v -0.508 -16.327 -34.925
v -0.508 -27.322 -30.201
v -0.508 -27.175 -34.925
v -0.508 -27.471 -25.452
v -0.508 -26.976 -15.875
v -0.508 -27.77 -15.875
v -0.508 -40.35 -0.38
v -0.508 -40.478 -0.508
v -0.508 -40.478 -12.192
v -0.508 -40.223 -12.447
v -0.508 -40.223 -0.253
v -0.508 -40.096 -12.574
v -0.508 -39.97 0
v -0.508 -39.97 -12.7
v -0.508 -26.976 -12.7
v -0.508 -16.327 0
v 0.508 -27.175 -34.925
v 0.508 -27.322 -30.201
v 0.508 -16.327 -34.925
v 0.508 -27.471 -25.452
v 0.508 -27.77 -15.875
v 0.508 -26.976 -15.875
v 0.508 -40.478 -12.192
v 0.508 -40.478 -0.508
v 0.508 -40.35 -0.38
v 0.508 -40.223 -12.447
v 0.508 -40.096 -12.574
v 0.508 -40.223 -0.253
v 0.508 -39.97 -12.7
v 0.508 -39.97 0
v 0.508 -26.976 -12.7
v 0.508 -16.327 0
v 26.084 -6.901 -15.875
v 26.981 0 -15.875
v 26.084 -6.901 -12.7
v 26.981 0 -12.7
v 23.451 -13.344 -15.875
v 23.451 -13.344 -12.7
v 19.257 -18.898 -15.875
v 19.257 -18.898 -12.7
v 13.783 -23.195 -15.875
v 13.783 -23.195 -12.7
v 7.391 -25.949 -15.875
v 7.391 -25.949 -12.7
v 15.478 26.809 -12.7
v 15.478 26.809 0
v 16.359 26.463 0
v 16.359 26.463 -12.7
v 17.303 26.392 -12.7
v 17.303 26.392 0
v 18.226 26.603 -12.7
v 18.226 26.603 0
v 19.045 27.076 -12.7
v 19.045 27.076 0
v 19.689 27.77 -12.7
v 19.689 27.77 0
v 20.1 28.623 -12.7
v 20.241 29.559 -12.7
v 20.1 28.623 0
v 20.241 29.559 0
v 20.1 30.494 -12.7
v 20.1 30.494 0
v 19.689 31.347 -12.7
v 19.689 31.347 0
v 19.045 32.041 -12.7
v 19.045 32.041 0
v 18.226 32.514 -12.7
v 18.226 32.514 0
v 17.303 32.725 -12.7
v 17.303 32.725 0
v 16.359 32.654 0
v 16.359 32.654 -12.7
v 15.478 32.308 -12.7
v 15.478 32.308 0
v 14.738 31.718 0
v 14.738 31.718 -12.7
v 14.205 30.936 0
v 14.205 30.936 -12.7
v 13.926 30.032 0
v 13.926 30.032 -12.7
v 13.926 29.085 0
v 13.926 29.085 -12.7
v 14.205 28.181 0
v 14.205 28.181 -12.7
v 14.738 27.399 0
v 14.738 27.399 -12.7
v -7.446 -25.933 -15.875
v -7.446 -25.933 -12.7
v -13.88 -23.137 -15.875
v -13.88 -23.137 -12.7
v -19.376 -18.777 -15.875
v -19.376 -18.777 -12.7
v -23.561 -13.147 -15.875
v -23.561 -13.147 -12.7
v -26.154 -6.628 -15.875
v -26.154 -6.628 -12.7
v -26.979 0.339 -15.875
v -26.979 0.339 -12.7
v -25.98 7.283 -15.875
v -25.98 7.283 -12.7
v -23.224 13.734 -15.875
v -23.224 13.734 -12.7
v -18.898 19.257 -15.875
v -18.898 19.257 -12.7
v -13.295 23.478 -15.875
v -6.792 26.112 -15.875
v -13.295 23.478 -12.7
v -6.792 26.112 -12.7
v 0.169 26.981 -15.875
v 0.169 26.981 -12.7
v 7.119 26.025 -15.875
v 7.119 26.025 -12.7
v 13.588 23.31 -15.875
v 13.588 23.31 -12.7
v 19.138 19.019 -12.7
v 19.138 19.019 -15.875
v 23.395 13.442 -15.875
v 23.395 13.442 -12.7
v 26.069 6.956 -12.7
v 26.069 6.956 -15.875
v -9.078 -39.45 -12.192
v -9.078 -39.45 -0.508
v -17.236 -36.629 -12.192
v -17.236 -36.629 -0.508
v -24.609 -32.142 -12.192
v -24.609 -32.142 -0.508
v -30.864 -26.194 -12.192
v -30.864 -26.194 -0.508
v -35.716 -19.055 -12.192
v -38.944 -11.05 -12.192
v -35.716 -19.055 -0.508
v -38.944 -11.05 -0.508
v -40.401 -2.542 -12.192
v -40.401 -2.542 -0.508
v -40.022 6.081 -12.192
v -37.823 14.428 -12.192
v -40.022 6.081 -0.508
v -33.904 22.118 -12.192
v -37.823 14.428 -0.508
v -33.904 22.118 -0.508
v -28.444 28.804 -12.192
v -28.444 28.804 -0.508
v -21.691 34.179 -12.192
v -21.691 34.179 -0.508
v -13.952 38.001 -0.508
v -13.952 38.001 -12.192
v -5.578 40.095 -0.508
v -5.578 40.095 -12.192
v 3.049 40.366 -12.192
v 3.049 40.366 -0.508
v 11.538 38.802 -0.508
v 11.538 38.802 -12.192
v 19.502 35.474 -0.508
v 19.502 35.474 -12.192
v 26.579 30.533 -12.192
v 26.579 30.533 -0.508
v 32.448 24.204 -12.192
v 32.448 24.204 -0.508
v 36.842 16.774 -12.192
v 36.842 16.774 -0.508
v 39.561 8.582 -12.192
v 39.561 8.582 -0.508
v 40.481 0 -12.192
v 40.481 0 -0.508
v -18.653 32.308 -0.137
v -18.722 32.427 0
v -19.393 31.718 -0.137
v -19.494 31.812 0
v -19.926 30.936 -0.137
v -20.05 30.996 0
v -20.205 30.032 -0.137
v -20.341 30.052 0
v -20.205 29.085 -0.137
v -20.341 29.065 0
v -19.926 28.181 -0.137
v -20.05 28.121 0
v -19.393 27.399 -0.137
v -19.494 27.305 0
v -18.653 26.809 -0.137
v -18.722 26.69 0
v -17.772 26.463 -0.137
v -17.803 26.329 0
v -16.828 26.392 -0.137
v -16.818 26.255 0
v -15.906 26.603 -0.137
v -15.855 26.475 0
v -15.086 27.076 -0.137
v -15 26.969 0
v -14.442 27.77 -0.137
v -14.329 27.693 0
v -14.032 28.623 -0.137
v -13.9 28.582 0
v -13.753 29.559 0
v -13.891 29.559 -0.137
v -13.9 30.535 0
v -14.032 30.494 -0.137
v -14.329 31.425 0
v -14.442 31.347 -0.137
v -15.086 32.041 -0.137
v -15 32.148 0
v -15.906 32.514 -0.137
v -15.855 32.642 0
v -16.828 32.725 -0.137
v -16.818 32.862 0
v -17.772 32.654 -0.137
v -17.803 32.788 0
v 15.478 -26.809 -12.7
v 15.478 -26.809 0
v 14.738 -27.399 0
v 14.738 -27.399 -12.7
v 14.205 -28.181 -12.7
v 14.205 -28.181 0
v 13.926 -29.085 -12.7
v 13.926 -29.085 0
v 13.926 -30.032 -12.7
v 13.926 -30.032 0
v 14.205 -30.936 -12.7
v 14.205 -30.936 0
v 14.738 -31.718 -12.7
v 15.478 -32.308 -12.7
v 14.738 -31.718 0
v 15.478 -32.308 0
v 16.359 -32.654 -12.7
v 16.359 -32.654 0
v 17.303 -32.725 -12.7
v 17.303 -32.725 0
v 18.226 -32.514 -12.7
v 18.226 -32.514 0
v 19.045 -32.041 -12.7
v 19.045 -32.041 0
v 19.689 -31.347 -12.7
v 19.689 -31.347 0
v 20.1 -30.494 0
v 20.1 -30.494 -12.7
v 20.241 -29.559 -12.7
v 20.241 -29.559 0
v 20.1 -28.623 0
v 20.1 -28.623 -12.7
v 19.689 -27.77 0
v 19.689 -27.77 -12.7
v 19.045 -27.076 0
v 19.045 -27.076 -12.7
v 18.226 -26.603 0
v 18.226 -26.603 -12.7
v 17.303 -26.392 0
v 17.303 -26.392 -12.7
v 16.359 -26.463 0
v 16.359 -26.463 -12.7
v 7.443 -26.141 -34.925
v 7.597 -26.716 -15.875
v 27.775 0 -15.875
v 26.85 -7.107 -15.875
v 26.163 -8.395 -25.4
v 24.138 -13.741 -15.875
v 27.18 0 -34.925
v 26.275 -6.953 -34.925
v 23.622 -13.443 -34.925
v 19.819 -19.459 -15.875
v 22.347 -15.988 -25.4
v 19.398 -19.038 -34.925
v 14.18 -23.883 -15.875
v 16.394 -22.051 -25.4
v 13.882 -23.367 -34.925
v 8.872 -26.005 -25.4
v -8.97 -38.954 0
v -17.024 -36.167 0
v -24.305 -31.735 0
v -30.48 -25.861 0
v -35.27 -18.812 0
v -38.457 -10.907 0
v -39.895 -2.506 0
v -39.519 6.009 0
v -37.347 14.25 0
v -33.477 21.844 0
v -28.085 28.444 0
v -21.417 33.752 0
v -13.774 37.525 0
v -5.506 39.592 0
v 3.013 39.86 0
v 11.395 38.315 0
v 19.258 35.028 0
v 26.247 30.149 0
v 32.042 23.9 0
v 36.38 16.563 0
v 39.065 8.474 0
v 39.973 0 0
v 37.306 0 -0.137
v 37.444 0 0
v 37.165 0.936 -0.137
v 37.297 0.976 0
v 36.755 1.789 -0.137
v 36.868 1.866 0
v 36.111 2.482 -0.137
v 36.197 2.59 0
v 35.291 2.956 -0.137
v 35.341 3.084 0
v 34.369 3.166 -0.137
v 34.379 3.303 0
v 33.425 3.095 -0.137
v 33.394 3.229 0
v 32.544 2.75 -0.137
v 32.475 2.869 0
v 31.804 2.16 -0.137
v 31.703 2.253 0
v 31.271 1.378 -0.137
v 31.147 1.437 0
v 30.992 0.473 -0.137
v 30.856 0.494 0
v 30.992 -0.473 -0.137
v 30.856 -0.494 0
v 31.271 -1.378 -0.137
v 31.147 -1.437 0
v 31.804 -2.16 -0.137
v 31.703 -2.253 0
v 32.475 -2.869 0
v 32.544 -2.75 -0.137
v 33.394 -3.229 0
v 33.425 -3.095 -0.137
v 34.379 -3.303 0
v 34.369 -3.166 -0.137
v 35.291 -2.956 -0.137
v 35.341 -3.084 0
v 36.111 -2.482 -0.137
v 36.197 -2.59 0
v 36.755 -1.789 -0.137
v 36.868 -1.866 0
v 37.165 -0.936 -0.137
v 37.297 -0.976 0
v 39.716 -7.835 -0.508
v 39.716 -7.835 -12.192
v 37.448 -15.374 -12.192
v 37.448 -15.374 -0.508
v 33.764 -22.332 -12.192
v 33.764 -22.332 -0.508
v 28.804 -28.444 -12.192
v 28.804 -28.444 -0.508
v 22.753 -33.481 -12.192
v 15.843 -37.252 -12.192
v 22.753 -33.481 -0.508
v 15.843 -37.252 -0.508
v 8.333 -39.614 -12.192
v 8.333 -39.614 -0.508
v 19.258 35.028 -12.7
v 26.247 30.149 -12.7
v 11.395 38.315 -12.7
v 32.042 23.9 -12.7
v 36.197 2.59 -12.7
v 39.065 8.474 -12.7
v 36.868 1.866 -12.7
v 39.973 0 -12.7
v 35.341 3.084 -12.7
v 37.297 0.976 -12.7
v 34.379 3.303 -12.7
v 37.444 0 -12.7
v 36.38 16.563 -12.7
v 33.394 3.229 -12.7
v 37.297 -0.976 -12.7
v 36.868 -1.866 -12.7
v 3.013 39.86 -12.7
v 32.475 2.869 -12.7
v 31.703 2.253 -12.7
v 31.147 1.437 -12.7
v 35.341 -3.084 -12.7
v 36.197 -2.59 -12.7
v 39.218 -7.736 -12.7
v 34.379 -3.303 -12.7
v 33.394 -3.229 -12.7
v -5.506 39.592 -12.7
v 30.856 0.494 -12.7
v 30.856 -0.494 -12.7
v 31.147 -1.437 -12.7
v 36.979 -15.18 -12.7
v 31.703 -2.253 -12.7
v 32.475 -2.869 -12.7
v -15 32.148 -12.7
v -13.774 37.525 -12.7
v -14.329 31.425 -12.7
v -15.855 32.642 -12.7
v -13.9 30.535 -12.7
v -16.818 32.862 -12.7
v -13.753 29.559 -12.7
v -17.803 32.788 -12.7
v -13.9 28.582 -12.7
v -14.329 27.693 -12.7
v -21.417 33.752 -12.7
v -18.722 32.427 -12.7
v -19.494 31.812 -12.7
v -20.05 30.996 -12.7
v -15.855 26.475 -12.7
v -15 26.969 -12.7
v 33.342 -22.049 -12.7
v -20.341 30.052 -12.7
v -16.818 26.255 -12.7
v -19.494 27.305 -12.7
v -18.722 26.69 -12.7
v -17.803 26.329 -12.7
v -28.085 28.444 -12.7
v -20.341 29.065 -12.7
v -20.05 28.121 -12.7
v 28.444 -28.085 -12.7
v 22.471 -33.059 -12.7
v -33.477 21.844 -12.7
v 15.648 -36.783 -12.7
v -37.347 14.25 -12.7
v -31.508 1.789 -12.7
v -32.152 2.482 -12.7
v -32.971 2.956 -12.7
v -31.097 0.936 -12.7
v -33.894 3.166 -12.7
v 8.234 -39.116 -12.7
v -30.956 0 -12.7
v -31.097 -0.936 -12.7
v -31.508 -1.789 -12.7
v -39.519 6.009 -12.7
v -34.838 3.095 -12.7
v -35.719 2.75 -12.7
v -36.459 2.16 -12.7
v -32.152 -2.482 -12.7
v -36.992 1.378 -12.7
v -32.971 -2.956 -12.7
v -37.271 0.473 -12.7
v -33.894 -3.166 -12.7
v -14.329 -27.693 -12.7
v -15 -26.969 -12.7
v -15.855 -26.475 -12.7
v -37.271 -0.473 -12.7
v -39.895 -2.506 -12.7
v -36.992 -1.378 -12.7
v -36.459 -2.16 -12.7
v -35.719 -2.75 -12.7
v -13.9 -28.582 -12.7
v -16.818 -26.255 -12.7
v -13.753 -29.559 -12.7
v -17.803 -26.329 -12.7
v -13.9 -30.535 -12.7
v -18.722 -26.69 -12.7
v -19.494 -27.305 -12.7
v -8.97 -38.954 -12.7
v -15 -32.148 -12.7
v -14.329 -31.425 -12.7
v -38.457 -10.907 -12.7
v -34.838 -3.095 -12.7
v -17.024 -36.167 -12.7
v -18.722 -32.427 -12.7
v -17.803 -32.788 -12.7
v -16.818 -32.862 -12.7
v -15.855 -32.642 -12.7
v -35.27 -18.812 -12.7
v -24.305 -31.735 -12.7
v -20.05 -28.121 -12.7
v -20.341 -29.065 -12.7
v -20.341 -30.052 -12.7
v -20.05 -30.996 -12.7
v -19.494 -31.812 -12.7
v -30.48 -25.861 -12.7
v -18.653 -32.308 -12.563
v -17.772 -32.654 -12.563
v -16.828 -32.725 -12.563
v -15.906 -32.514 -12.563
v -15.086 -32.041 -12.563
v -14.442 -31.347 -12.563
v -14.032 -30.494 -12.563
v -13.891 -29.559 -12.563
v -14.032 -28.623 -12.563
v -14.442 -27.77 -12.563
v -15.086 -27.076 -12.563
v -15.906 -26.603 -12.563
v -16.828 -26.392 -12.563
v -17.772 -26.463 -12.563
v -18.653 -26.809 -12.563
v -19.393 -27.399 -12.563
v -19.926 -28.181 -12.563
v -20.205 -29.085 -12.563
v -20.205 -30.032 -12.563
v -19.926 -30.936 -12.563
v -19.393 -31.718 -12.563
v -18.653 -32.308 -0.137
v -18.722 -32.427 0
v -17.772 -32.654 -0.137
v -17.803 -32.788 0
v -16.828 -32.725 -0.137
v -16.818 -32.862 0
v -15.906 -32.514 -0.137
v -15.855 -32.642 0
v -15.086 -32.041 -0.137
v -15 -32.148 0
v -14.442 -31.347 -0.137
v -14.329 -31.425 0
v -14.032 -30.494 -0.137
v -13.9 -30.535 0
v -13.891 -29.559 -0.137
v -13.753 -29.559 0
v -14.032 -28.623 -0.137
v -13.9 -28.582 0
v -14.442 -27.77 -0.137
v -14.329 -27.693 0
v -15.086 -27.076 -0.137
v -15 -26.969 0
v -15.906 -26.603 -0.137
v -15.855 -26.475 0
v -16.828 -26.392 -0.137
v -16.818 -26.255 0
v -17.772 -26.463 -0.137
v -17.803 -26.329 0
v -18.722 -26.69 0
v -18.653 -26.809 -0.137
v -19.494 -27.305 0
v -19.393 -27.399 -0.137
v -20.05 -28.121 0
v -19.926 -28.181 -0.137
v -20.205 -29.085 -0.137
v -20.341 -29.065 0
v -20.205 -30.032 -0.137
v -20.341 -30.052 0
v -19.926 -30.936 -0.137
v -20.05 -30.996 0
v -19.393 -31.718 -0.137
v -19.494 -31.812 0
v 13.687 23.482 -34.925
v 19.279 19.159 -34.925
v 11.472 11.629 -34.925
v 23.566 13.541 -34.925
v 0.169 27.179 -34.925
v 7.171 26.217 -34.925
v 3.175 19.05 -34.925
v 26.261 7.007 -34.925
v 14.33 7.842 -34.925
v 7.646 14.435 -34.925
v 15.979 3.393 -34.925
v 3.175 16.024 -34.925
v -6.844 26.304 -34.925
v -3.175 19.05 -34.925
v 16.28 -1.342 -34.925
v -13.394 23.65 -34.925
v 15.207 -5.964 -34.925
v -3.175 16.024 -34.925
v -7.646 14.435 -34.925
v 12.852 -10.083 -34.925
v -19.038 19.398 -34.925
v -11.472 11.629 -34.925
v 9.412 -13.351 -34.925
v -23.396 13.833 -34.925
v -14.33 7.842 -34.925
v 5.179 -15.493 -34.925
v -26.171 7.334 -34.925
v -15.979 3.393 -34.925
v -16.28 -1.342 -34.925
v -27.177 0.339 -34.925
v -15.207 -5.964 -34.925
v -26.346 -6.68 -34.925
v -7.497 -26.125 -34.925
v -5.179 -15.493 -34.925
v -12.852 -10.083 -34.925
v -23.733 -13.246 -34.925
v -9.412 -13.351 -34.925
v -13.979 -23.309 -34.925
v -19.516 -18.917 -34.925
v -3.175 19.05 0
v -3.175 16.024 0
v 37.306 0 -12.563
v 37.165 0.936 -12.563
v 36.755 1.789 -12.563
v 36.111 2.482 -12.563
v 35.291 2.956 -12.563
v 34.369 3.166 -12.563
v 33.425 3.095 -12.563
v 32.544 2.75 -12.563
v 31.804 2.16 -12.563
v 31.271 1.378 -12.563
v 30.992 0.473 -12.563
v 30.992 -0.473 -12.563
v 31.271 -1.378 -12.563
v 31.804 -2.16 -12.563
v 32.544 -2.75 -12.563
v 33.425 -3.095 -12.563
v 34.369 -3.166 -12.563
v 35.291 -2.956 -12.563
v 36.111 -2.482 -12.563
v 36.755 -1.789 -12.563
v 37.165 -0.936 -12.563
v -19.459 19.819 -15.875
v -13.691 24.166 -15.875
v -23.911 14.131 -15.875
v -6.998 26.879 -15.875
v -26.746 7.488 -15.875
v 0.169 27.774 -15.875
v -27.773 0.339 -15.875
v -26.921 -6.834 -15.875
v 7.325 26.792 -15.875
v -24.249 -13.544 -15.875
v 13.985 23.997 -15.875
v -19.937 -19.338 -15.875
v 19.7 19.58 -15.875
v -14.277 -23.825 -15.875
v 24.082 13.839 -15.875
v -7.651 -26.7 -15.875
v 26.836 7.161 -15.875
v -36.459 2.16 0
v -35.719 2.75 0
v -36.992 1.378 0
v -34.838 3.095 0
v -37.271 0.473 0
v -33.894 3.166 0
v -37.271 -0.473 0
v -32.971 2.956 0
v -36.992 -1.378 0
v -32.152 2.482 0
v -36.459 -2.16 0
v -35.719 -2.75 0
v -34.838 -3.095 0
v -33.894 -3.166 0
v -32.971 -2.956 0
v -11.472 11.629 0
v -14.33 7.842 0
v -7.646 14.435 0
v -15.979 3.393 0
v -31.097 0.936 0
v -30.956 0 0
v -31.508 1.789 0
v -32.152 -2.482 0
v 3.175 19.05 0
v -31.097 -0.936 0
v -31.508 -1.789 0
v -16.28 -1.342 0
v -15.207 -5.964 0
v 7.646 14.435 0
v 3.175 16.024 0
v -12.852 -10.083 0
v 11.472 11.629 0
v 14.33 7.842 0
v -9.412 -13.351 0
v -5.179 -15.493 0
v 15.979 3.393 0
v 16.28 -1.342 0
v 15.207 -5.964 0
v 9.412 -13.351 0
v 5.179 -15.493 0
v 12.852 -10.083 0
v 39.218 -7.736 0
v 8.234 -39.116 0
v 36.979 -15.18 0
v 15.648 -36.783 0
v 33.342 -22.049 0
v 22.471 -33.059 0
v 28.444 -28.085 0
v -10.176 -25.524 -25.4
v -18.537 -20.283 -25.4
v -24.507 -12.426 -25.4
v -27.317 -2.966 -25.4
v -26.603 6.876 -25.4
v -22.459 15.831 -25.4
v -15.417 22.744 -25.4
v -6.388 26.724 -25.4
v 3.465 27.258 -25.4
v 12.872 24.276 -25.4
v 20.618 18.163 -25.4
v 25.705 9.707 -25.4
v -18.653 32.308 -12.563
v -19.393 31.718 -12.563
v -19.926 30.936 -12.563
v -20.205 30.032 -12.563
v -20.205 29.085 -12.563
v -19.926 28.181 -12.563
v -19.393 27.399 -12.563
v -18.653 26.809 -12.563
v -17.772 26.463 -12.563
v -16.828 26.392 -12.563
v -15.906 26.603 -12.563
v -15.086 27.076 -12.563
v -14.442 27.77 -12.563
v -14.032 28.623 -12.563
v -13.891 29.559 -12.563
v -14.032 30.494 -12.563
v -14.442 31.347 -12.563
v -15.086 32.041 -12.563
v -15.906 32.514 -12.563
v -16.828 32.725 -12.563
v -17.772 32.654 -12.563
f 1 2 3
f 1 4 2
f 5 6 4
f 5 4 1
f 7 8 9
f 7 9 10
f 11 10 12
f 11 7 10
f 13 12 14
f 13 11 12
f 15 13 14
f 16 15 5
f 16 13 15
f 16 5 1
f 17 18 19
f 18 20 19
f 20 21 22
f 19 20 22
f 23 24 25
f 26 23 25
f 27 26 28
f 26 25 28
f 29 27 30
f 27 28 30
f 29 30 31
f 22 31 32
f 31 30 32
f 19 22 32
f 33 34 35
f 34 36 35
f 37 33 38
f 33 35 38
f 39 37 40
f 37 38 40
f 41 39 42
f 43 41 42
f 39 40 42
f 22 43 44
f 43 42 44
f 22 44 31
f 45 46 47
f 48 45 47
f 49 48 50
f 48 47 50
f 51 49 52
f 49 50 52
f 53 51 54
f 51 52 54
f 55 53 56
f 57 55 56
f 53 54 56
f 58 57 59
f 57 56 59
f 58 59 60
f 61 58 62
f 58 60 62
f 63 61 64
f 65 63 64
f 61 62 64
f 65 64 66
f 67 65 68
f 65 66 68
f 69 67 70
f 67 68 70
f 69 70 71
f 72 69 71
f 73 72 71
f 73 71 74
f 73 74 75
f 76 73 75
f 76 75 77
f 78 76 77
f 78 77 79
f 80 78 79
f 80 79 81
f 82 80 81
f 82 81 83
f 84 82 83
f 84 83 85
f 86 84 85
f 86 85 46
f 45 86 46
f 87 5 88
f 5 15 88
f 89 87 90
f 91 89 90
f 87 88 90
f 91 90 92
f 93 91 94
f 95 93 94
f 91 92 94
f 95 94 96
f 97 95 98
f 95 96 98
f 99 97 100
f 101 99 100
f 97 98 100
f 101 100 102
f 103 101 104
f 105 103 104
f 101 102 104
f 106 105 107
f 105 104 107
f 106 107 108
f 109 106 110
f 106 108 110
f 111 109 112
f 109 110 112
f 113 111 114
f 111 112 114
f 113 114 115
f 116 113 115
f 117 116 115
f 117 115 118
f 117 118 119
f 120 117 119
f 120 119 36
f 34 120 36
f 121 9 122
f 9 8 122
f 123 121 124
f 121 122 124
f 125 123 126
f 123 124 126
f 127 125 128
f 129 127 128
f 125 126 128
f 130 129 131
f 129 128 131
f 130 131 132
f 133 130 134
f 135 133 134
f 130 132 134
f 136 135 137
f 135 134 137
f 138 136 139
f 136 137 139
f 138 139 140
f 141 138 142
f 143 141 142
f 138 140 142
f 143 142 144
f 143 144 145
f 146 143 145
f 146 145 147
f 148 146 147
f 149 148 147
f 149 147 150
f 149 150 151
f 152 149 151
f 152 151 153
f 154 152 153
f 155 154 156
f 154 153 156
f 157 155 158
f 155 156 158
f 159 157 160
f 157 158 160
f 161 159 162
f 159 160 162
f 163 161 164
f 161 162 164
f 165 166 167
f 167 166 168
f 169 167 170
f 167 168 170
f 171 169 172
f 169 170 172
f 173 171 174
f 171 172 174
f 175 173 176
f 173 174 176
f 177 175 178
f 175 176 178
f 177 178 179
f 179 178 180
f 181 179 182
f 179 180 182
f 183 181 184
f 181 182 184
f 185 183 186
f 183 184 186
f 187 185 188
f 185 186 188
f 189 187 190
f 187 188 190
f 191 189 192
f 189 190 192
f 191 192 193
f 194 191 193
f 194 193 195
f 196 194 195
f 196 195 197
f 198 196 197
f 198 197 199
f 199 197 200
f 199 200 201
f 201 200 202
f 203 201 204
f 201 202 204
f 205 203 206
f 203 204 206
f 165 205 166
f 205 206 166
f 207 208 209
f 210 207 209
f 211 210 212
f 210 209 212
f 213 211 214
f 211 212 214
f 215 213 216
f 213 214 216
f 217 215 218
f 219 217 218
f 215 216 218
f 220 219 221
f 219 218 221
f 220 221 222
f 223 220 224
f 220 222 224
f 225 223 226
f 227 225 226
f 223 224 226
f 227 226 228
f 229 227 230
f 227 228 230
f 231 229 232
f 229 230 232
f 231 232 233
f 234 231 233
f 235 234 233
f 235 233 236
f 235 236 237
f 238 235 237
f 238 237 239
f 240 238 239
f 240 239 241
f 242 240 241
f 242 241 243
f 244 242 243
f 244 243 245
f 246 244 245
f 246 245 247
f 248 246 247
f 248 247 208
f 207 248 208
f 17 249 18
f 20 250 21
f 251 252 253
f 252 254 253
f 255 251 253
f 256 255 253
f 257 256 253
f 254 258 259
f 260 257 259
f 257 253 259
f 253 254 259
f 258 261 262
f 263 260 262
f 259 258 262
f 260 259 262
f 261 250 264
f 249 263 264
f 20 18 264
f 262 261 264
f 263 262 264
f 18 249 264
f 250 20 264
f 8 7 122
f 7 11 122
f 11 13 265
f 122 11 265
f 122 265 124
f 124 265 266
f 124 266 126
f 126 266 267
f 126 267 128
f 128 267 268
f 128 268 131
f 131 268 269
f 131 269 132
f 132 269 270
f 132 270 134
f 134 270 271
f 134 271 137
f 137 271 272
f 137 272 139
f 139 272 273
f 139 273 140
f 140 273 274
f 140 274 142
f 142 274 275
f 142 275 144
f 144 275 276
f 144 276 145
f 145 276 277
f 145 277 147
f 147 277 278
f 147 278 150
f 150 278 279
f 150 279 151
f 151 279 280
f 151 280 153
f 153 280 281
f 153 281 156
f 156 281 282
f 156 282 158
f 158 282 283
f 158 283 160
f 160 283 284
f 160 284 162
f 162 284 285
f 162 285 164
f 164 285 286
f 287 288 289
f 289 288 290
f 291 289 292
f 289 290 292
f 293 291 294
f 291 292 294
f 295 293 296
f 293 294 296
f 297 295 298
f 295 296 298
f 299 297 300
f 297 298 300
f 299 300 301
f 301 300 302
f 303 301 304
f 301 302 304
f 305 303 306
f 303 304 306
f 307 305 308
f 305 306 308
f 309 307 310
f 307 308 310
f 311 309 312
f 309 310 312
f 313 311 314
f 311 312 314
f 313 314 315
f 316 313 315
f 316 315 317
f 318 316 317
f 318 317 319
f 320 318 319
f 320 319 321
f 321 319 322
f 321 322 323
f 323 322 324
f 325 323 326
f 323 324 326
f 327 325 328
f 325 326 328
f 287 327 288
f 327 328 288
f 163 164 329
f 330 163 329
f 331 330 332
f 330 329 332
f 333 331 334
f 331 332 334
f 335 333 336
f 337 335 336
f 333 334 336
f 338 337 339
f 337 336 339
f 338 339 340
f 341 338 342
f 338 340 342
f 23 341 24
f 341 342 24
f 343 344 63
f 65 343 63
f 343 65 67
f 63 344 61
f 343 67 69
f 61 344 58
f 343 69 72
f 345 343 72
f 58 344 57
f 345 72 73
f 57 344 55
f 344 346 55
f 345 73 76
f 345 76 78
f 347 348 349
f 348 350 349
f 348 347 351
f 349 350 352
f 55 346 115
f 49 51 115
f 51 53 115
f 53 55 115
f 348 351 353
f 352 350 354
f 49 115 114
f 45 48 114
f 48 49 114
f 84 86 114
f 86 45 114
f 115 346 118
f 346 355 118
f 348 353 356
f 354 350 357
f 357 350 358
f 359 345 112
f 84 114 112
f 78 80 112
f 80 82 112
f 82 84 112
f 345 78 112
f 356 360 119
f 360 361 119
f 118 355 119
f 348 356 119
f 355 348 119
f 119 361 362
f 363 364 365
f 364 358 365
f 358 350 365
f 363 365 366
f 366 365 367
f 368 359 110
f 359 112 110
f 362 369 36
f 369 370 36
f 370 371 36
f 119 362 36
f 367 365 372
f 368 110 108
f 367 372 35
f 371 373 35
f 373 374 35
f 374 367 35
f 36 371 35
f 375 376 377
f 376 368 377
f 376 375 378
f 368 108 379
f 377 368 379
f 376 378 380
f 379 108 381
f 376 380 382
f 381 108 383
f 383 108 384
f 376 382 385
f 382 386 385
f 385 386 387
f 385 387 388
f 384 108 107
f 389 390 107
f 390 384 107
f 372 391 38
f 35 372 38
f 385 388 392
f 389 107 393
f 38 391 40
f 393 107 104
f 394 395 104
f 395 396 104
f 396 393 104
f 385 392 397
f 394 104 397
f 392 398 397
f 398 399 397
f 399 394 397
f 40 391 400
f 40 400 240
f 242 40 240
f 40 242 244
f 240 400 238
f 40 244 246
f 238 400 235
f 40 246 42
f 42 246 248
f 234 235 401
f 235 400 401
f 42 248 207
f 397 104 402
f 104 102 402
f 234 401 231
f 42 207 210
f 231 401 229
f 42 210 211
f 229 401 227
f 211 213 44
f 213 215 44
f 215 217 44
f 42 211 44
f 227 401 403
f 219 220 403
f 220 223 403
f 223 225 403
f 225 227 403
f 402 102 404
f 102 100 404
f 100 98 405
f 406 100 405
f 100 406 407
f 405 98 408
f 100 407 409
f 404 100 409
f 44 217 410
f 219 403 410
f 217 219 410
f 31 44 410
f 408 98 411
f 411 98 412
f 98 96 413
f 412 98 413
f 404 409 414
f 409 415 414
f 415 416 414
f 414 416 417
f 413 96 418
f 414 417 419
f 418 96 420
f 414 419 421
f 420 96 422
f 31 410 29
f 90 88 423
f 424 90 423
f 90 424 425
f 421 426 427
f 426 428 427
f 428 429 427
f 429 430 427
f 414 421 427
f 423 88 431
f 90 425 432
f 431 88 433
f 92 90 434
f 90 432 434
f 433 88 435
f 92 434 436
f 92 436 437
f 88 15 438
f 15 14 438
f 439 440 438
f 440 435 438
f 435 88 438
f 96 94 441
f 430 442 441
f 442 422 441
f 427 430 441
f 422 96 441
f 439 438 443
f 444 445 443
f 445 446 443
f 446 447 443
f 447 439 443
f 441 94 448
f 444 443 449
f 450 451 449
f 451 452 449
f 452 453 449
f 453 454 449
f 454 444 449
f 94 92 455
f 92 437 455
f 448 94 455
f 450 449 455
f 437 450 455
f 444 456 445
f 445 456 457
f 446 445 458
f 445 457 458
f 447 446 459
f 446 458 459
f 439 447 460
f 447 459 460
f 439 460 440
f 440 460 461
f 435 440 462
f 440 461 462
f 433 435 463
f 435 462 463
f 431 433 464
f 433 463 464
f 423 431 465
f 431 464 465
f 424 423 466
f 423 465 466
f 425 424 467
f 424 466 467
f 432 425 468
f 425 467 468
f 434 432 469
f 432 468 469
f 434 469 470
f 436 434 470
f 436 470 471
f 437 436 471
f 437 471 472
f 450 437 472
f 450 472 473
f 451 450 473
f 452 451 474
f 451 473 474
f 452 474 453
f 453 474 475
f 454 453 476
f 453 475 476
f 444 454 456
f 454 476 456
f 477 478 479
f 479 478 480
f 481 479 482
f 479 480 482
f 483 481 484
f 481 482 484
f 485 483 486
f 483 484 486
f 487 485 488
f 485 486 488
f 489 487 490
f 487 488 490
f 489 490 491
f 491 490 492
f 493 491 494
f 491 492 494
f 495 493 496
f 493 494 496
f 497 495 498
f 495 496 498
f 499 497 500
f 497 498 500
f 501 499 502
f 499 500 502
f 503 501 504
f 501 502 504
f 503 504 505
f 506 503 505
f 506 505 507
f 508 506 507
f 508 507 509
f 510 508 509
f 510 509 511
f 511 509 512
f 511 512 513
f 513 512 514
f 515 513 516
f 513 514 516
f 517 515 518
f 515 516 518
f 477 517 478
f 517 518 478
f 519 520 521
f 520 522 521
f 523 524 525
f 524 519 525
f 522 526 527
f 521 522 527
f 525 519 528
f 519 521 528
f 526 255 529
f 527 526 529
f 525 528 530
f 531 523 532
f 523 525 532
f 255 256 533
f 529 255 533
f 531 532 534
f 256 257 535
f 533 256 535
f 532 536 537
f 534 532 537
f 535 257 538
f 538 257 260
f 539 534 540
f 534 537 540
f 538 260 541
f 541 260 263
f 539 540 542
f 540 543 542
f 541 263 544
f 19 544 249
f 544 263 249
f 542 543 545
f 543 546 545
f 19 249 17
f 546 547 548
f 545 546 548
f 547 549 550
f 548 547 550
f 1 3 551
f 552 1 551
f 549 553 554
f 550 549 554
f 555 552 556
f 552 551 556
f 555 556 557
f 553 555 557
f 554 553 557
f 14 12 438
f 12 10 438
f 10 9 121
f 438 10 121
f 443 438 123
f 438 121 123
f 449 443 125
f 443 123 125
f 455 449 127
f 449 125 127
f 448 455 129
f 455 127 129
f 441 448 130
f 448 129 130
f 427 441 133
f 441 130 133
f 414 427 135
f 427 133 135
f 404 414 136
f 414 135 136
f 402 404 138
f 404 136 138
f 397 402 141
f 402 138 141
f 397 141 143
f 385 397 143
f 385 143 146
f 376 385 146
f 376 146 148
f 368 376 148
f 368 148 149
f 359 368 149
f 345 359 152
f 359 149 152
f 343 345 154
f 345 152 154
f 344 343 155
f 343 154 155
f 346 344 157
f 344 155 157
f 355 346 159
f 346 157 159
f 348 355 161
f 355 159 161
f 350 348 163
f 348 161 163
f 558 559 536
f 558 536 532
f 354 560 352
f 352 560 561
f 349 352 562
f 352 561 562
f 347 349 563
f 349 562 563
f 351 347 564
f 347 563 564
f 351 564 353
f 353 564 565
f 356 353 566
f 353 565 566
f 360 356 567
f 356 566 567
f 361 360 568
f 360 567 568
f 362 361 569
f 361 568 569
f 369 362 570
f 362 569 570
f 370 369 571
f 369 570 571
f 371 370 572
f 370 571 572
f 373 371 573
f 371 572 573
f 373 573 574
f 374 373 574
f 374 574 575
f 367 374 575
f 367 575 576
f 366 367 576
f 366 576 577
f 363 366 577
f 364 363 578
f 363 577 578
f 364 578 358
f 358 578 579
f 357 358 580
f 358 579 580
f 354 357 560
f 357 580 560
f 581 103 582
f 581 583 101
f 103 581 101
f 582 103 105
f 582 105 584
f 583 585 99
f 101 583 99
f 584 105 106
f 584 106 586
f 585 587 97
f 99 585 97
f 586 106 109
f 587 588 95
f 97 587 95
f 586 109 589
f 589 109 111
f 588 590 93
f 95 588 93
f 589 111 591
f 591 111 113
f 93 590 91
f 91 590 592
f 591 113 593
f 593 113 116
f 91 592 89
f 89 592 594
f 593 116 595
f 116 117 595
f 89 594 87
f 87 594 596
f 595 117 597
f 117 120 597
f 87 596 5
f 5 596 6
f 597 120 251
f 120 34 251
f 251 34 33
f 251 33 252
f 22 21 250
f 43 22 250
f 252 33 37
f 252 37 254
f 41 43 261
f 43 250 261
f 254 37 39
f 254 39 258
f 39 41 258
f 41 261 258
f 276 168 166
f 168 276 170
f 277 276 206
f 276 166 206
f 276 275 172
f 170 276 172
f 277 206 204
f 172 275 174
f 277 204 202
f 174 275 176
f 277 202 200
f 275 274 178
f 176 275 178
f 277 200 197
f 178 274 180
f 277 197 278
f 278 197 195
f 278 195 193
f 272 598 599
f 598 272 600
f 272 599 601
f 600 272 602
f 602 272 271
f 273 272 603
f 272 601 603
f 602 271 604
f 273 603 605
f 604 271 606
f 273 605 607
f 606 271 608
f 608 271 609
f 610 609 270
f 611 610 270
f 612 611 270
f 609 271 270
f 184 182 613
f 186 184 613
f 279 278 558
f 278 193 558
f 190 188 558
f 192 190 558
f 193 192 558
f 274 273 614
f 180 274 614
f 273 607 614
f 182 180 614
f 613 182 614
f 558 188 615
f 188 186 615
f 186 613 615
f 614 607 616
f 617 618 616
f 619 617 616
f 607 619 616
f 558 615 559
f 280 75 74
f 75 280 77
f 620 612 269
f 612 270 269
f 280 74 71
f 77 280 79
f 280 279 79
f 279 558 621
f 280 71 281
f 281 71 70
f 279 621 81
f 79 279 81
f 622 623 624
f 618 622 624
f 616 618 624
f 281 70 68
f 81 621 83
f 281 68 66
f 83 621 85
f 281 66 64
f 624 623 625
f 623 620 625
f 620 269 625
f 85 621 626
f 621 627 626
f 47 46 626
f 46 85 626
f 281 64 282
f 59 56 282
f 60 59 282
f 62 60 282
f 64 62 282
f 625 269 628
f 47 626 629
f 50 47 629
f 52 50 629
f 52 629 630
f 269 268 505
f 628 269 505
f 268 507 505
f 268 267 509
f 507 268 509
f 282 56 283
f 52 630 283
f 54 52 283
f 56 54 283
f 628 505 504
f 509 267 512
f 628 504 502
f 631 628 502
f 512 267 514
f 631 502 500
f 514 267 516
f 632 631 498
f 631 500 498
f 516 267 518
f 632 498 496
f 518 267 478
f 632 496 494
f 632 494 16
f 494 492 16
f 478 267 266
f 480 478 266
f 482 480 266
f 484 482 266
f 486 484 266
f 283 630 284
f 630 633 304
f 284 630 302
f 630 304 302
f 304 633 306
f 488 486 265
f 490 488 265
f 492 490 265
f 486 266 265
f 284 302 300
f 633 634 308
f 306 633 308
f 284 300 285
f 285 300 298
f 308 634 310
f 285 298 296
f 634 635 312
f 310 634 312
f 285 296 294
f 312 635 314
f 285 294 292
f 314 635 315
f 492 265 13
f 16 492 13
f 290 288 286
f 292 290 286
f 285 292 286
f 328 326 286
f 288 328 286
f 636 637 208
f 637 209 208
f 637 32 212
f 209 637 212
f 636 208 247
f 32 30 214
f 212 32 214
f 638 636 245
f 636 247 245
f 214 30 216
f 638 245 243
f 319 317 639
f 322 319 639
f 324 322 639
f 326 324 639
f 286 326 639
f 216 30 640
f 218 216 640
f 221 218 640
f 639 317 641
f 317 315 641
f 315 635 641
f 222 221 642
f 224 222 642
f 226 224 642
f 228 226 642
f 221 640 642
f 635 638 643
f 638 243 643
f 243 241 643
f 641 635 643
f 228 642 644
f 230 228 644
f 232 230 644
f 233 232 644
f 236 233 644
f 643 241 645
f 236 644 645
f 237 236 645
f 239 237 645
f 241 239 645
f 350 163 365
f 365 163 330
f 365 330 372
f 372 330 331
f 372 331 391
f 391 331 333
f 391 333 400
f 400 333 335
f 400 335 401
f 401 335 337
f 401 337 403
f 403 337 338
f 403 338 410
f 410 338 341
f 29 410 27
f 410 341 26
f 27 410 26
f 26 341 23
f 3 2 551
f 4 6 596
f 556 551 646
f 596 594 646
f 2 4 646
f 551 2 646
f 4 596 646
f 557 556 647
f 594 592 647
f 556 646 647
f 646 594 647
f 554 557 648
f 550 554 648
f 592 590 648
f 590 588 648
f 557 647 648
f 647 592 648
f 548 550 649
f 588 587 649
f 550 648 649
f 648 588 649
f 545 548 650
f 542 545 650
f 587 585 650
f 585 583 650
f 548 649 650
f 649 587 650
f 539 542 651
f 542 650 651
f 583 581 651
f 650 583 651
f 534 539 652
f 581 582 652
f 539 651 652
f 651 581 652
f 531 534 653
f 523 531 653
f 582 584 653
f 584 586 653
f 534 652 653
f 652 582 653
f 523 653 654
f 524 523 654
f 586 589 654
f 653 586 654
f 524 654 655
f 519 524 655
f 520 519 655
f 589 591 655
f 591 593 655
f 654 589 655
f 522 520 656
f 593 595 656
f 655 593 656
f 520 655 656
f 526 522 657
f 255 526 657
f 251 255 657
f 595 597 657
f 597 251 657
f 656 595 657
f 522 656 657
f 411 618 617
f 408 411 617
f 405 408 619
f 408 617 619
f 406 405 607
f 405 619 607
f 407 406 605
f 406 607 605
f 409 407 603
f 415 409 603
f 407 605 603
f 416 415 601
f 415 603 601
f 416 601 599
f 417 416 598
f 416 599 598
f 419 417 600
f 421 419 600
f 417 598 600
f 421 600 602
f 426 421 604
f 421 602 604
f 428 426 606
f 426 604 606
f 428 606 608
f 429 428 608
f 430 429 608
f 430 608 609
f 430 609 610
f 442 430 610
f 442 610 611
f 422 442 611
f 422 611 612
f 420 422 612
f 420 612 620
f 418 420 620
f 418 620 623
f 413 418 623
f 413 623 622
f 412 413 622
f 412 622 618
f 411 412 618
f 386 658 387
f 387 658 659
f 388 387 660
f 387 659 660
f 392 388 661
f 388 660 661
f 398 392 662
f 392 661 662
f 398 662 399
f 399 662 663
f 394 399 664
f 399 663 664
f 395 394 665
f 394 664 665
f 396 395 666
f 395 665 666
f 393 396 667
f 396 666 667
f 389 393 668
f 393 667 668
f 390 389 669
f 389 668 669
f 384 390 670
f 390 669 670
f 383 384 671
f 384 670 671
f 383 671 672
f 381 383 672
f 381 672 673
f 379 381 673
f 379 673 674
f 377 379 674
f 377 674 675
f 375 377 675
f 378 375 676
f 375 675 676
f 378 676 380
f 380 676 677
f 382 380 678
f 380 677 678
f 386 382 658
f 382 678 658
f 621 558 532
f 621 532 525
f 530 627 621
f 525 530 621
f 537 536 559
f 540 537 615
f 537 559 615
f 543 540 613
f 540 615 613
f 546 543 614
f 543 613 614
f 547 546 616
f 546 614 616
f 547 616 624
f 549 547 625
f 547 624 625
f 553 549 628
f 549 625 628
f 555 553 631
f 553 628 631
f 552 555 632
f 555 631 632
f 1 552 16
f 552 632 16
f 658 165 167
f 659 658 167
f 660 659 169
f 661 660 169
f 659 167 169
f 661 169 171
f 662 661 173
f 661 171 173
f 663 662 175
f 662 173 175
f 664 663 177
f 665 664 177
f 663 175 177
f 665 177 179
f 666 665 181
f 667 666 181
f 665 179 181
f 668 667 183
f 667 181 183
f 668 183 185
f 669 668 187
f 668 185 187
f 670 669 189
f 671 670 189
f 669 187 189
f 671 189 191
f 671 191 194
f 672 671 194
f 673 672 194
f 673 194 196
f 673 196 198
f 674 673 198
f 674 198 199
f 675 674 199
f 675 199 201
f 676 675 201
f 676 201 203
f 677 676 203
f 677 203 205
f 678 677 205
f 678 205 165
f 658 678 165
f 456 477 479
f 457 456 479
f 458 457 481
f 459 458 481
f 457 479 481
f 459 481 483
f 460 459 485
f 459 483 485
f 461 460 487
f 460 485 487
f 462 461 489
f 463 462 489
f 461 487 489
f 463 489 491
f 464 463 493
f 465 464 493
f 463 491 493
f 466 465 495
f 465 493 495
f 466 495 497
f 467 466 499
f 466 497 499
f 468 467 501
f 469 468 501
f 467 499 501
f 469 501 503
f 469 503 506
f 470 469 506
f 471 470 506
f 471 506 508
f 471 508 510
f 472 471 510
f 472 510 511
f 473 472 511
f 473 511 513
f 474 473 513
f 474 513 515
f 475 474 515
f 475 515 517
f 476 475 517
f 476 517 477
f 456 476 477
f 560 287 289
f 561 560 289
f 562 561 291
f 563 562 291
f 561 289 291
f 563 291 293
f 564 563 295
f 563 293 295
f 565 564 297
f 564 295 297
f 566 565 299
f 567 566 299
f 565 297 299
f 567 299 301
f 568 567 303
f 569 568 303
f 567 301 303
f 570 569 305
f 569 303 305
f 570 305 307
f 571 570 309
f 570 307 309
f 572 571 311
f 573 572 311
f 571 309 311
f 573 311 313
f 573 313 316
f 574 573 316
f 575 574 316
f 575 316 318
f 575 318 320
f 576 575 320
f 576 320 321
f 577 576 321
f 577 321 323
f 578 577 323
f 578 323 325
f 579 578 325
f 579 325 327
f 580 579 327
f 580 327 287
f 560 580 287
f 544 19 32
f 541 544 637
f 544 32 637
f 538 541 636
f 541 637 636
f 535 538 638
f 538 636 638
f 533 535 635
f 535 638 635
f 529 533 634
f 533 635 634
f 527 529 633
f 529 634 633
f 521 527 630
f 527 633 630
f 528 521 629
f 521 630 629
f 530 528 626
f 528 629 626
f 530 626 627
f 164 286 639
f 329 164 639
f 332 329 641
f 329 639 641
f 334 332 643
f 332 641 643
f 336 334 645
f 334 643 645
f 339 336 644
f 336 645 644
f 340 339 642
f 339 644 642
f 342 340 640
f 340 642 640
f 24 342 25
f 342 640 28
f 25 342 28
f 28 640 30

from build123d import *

# Parameters (mm, degrees)
SKETCH3_W           = 1.016
SKETCH3_H           = 40.48125
CUT_EXTRUDE1_DEPTH  = 68.06130649
CUT_EXTRUDE2_REACH  = 69.061
SKETCH4_R           = 3.175
CIRPATTERN1_COUNT   = 3
SKETCH16_W          = 6.35
SKETCH16_H          = 6.35
CUT_EXTRUDE7_DEPTH  = 68.06130649
SKETCH24_R          = 16.335149264
CUT_EXTRUDE13_DEPTH = 68.06130649


# Read off the part's stored shape, not the designer's step: Cut-Extrude3, Cut-Extrude4
with BuildPart() as part:
    # Sketch1 → Revolve1 (revolve)
    with BuildSketch(Plane(origin=(0, 0, 0), x_dir=(0, 0, -1), z_dir=(1, 0, 0)), mode=Mode.PRIVATE) as revolve1_sk:
        Polygon((34.925, -27.1795875), (15.875, -27.7749), (15.875, -26.98115), (12.7, -26.98115), (12.7, -39.97325), (12.192, -40.48125), (0.508, -40.48125), (0, -39.97325), (0, -15.875), (34.925, -15.875), align=None)
    revolve(revolve1_sk.sketch.rotate(Axis((0, 0, 0), (0, 0, -1)), 270), axis=Axis((0, 0, 0), (0, 0, -1)))

    # Sketch3 → Cut-Extrude1 (cut, through all)
    with BuildSketch(Plane.XY):
        with Locations((0, -20.240625)):
            Rectangle(SKETCH3_W, SKETCH3_H)
    extrude(amount=-CUT_EXTRUDE1_DEPTH, mode=Mode.SUBTRACT)

    # Sketch4 → Cut-Extrude2 (cut, up to next)
    with BuildSketch(Plane.XY, mode=Mode.PRIVATE) as cut_extrude2_sk1:
        with Locations((34.13125, 0)):
            Circle(SKETCH4_R)
    cut_extrude2_tool1 = extrude(cut_extrude2_sk1.sketch, amount=-CUT_EXTRUDE2_REACH, mode=Mode.PRIVATE) & part.part
    # Sketch4 → Cut-Extrude2 (cut, up to next)
    with BuildSketch(Plane.XY, mode=Mode.PRIVATE) as cut_extrude2_sk2:
        with Locations((-34.13125, 0)):
            Circle(SKETCH4_R)
    cut_extrude2_tool2 = extrude(cut_extrude2_sk2.sketch, amount=-CUT_EXTRUDE2_REACH, mode=Mode.PRIVATE) & part.part
    cut_extrude2_1 = cut_extrude2_tool1.solids().sort_by_distance((34.13125, 0, 0))[0]
    add(cut_extrude2_1, mode=Mode.SUBTRACT)
    cut_extrude2_2 = cut_extrude2_tool2.solids().sort_by_distance((-34.13125, 0, 0))[0]
    add(cut_extrude2_2, mode=Mode.SUBTRACT)
    cut_extrude2 = cut_extrude2_1 + cut_extrude2_2  # Cut-Extrude2 as one shape, for the pattern or mirror that repeats it

    # Cut-Extrude3 outline → Cut-Extrude3 (revolve, cut)
    with BuildSketch(Plane(origin=(34.13125, 0, 0), x_dir=(1, 0, 0), z_dir=(0, -1, 0))):
        Polygon((3.175, 0), (3.175, -0.137481533), (3.312481533, 0), align=None)
    cut_extrude3 = revolve(axis=Axis((34.13125, 0, 0), (0, 0, 1)), mode=Mode.SUBTRACT)

    # Cut-Extrude4 outline → Cut-Extrude4 (revolve, cut)
    with BuildSketch(Plane(origin=(34.13125, 0, 0), x_dir=(1, 0, 0), z_dir=(0, -1, 0))):
        Polygon((3.312481533, -12.7), (3.175, -12.562518467), (3.175, -12.7), align=None)
    cut_extrude4 = revolve(axis=Axis((34.13125, 0, 0), (0, 0, 1)), mode=Mode.SUBTRACT)

    # CirPattern1: Cut-Extrude2, Cut-Extrude3, Cut-Extrude4 ×3 about axis
    cirpattern1_axis = Axis((0, 0, 0), (0, 0, 1))
    add([cut_extrude2.rotate(cirpattern1_axis, i * 360 / CIRPATTERN1_COUNT) for i in range(1, CIRPATTERN1_COUNT)], mode=Mode.SUBTRACT)
    add([cut_extrude3.rotate(cirpattern1_axis, i * 360 / CIRPATTERN1_COUNT) for i in range(1, CIRPATTERN1_COUNT)], mode=Mode.SUBTRACT)
    add([cut_extrude4.rotate(cirpattern1_axis, i * 360 / CIRPATTERN1_COUNT) for i in range(1, CIRPATTERN1_COUNT)], mode=Mode.SUBTRACT)

    # Sketch16 → Cut-Extrude7 (cut, through all)
    with BuildSketch(Plane.XY):
        with Locations((0, 15.875)):
            Rectangle(SKETCH16_W, SKETCH16_H)
    extrude(amount=-CUT_EXTRUDE7_DEPTH, mode=Mode.SUBTRACT)

    # Sketch24 → Cut-Extrude13 (cut, through all)
    with BuildSketch(Plane.XY):
        Circle(SKETCH24_R)
    extrude(amount=-CUT_EXTRUDE13_DEPTH, mode=Mode.SUBTRACT)


solid = part.part
